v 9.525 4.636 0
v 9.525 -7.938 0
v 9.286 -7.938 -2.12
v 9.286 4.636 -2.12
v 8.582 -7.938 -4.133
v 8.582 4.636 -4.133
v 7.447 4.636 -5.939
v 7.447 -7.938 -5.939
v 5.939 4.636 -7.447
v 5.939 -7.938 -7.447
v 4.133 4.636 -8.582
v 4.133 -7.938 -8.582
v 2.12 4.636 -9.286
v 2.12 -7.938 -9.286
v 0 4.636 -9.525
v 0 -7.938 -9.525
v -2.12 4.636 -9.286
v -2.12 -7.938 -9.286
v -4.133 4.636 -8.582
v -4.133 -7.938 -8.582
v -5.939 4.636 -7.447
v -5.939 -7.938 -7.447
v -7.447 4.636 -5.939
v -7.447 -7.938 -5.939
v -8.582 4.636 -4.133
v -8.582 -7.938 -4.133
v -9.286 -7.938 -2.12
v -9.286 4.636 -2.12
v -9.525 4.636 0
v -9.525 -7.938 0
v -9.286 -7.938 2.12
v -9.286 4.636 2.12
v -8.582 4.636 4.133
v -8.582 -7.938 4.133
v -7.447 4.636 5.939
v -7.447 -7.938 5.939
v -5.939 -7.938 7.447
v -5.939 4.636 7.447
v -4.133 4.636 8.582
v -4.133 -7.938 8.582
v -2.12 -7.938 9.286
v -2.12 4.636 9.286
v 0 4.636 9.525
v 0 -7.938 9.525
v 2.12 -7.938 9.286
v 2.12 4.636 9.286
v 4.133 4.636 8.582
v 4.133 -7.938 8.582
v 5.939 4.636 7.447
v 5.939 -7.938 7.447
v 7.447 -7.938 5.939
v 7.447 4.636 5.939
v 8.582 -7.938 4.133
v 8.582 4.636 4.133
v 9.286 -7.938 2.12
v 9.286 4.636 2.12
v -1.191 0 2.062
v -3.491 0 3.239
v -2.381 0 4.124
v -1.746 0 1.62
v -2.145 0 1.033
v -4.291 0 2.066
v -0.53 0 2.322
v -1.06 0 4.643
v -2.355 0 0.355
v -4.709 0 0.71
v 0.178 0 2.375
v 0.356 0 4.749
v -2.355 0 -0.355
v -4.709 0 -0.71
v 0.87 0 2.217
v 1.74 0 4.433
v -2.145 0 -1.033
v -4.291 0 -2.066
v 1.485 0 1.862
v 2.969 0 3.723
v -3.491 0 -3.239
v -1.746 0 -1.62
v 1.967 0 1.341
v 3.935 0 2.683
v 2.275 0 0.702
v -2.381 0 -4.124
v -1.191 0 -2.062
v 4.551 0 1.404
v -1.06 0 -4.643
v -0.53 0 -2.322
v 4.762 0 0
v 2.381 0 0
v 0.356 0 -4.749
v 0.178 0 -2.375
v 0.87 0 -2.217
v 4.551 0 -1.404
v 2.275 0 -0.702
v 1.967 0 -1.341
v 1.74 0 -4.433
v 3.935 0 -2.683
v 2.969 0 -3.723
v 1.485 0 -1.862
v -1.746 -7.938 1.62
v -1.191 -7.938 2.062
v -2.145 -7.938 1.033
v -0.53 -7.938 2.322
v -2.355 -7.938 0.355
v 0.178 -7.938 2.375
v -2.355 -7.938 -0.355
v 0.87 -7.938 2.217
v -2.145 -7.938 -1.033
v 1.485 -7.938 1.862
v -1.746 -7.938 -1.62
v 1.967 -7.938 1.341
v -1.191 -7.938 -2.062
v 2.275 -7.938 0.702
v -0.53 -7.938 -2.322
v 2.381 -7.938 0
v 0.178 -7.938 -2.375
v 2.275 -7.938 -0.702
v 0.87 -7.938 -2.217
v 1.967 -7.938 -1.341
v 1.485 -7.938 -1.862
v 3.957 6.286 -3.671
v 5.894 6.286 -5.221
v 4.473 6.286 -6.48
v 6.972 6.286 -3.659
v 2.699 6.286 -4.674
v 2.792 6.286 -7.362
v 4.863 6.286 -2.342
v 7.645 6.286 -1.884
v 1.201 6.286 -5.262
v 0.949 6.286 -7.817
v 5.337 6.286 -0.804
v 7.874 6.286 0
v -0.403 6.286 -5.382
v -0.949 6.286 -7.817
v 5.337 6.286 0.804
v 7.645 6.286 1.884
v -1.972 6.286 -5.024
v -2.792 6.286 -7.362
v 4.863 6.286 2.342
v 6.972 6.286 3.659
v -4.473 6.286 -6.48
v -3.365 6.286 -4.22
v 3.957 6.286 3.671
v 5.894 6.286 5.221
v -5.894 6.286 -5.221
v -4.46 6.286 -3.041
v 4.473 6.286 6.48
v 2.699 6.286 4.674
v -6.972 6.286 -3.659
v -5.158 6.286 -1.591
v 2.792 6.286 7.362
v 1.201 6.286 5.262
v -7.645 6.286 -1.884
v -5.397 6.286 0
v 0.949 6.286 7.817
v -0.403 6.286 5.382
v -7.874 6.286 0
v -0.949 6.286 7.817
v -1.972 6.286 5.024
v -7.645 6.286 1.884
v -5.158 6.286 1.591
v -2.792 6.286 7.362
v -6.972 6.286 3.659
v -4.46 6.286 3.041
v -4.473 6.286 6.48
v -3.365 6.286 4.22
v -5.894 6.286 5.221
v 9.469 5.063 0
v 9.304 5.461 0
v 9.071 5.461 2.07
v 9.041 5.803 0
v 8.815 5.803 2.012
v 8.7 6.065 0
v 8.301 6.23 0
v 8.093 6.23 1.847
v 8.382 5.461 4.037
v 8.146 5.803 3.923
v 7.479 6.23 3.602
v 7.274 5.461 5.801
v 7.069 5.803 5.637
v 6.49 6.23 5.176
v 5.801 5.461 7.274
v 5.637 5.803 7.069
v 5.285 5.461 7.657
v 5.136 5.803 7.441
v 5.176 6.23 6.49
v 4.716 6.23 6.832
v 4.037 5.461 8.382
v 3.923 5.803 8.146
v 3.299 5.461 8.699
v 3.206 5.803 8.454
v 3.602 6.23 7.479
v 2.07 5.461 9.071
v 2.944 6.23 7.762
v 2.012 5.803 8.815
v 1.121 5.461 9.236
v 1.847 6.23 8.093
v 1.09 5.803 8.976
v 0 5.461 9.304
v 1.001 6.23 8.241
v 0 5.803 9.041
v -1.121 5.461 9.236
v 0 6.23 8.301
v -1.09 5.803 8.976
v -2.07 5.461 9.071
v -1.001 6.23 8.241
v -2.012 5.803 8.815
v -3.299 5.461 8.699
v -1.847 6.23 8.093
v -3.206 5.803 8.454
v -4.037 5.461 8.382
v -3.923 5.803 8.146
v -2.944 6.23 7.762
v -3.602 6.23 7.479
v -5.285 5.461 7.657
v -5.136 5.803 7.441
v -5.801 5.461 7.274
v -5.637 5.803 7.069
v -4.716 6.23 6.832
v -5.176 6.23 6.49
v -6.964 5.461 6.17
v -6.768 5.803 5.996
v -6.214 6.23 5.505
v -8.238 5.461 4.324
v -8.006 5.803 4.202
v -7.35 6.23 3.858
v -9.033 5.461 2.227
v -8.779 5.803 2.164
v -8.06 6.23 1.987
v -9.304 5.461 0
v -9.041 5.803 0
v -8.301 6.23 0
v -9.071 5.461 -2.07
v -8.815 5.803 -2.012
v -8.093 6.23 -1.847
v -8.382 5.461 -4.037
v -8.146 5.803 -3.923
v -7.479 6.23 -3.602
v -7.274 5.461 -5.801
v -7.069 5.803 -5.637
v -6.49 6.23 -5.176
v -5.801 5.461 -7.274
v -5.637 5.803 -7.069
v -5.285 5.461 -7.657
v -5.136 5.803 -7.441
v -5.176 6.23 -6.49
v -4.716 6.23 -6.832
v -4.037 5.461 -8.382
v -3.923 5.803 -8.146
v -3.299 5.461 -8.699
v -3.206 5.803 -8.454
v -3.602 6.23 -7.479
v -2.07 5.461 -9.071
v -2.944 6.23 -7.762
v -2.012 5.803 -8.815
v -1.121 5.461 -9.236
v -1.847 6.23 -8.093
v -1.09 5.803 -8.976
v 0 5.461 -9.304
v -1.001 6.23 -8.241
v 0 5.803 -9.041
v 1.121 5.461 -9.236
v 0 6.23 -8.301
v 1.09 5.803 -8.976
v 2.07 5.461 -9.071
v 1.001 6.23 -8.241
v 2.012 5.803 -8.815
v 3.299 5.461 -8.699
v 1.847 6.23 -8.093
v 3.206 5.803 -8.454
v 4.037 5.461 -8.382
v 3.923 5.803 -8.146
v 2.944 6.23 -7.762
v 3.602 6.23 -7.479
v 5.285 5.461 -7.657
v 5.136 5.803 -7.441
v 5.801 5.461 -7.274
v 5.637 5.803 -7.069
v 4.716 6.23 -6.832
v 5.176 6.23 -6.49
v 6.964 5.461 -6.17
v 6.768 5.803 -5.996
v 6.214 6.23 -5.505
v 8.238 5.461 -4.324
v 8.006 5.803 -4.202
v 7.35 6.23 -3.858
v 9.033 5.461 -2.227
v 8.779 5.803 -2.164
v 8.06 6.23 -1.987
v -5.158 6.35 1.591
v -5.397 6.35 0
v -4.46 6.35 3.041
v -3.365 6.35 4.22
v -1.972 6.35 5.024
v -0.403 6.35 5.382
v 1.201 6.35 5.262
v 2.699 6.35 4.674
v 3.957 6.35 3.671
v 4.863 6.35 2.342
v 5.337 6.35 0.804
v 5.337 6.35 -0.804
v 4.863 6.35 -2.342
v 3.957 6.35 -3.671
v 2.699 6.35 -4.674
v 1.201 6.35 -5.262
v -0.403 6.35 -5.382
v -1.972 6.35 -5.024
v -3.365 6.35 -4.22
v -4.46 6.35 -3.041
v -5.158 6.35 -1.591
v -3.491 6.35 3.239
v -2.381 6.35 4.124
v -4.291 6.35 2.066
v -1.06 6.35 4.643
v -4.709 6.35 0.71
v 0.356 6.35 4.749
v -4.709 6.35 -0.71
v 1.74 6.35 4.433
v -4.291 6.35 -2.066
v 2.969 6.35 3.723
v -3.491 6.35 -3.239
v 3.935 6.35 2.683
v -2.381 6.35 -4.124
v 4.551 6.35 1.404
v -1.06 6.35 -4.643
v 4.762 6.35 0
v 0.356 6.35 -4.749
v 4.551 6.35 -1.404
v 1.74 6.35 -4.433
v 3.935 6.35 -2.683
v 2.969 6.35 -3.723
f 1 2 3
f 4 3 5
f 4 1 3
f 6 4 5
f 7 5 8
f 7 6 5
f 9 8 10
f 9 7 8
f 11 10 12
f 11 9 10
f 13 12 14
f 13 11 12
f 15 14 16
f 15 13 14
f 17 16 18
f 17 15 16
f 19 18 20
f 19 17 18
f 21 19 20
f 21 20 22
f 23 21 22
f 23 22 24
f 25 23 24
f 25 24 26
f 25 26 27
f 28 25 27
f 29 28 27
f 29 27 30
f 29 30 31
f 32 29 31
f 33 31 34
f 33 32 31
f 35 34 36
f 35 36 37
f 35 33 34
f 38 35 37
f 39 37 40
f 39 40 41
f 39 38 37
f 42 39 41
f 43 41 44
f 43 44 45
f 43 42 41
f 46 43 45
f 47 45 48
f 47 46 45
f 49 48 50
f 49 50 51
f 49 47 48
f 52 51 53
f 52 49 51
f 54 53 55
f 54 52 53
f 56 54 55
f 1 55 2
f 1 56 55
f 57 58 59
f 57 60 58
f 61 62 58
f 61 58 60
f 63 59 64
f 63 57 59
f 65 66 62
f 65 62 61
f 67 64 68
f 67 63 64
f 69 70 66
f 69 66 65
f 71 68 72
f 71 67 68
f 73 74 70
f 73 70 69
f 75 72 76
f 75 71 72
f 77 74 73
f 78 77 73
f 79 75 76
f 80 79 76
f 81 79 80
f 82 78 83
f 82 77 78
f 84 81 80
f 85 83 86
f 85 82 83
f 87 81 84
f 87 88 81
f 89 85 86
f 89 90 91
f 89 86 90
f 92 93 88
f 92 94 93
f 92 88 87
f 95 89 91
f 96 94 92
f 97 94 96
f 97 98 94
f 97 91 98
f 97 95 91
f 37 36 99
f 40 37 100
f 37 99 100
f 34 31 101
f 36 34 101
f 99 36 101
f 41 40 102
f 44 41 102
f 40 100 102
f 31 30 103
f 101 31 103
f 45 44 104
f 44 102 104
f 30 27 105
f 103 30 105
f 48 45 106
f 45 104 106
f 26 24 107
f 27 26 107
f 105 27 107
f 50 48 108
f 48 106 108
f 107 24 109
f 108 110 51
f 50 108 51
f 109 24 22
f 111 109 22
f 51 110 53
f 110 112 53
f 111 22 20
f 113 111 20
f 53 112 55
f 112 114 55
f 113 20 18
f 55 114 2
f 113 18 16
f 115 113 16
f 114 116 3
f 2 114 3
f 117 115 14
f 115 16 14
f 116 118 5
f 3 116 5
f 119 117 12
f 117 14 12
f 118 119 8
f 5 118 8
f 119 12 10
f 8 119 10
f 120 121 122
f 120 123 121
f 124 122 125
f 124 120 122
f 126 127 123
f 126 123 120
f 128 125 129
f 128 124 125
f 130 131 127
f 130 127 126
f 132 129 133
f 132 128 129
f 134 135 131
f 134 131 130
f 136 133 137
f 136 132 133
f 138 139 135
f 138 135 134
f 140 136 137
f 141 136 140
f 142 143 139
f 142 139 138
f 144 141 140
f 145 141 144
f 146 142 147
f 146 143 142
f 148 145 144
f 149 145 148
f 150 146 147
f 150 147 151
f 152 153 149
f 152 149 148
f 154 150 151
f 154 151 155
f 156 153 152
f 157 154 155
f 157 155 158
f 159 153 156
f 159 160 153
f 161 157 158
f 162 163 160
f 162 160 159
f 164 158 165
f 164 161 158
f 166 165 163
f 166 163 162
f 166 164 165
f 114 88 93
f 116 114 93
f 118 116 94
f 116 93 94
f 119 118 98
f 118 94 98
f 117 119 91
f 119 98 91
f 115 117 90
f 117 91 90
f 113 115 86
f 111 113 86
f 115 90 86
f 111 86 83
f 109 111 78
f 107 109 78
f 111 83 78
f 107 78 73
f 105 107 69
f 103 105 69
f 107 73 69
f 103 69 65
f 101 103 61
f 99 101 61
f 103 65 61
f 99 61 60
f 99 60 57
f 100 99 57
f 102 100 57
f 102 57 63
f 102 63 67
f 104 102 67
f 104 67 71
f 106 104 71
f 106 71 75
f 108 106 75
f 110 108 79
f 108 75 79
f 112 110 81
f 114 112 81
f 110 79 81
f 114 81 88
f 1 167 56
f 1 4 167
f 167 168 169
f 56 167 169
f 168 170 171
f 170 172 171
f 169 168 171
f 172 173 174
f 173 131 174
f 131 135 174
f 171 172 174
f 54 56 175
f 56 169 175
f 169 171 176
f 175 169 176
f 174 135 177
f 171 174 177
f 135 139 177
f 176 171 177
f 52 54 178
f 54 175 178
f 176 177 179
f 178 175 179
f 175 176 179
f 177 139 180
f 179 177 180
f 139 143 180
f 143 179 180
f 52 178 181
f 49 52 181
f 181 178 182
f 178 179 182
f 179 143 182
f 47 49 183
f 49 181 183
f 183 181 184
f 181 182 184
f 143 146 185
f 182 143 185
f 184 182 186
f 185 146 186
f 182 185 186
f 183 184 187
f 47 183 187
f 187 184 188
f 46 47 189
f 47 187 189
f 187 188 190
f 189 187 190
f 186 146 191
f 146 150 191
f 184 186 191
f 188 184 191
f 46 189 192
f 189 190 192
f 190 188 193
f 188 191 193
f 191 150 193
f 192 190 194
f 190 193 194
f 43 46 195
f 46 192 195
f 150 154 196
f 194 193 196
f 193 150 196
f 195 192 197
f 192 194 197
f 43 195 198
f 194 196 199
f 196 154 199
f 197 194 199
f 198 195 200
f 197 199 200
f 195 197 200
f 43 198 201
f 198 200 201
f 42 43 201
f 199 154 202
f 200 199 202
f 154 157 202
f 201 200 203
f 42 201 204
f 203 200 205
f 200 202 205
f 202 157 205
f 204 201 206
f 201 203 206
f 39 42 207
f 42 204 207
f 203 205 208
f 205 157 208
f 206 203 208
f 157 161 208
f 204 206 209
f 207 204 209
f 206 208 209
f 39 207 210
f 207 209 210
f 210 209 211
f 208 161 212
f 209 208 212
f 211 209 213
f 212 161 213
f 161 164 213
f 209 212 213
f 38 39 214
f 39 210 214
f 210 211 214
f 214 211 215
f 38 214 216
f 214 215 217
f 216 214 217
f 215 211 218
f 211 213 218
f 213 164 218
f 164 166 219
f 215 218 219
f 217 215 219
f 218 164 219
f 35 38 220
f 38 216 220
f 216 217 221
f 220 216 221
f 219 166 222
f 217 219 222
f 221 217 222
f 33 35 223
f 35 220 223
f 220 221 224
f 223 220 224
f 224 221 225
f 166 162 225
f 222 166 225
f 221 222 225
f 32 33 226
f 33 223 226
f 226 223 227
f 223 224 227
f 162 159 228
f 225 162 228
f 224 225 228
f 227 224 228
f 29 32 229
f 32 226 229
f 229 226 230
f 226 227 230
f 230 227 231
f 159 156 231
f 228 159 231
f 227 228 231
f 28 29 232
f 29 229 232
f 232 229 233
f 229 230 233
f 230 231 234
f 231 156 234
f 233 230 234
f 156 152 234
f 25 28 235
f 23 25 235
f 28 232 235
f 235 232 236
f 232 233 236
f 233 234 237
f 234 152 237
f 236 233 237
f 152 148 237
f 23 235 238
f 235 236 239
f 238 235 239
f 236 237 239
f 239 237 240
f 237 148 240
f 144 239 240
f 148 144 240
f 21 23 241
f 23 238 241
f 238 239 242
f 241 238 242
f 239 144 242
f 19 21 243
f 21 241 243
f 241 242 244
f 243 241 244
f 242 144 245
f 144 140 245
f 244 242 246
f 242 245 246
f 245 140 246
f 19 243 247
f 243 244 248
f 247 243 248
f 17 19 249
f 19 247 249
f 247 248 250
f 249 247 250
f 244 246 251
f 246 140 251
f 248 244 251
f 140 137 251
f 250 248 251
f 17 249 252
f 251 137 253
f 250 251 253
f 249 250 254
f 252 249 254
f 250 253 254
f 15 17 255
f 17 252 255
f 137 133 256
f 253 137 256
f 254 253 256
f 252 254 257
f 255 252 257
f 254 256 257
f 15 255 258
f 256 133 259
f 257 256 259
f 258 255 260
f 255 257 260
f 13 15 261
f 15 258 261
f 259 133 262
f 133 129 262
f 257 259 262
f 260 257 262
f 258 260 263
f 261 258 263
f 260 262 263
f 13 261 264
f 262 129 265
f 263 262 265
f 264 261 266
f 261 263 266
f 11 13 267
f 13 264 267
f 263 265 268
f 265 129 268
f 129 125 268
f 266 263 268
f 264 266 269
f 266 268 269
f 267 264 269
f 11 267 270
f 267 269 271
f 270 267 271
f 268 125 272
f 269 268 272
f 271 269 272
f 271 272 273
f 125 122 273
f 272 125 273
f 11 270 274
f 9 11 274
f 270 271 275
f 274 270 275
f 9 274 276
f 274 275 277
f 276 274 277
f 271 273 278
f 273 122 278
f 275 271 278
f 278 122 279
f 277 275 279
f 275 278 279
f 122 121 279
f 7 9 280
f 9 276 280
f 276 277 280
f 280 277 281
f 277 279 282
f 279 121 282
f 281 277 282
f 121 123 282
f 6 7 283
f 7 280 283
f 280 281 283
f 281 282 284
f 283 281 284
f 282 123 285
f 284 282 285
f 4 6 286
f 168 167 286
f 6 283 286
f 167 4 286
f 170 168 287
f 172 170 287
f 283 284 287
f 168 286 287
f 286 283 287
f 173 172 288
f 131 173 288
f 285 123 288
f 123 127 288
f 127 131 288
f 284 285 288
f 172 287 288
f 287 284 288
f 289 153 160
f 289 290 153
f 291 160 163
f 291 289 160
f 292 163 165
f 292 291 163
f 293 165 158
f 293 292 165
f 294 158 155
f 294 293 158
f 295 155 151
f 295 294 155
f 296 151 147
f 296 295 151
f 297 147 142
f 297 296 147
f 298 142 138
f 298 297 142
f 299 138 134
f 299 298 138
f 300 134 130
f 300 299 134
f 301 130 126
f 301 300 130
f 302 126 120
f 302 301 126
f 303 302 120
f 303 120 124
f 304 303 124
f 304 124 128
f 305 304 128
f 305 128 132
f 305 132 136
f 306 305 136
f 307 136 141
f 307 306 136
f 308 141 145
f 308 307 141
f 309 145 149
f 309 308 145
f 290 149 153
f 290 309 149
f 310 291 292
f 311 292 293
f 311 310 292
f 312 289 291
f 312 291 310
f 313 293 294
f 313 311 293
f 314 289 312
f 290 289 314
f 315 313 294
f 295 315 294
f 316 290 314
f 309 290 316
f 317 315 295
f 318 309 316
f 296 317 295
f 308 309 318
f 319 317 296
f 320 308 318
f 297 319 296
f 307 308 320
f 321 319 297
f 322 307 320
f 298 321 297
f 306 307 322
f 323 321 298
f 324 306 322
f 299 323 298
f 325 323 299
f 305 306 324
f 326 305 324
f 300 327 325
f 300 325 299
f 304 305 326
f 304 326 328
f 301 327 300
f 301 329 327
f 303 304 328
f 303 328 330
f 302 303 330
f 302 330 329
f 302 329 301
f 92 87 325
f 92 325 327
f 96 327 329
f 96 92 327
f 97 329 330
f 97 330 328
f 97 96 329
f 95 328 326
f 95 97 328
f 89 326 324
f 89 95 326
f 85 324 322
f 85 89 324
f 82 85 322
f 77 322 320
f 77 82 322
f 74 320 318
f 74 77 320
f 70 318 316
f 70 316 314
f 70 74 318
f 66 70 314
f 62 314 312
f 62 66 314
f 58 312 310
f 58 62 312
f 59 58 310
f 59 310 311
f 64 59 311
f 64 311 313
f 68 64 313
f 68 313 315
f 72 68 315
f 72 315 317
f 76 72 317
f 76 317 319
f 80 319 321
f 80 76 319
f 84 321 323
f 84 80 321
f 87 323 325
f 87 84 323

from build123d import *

# Parameters (mm, degrees)
SKETCH3_R                = 9.525
SKETCH3_R_2              = 2.38125
BOSS_EXTRUDE1_DEPTH      = 6.35
BOSS_EXTRUDE1_DEPTH_BACK = 7.9375
SKETCH4_R                = 4.7625
CUT_EXTRUDE1_DEPTH       = 6.35
SKETCH5_W                = 4.1275
SKETCH5_H                = 0.0635
FILLET2_R                = 1.651


with BuildPart() as part:
    # Sketch3 → Boss-Extrude1 (new body, two sides)
    with BuildSketch(Plane(origin=(0, 0, 0), x_dir=(1, 0, 0), z_dir=(0, 1, 0))) as boss_extrude1_sk:
        Circle(SKETCH3_R)
        Circle(SKETCH3_R_2, mode=Mode.SUBTRACT)
    extrude(amount=BOSS_EXTRUDE1_DEPTH)
    extrude(boss_extrude1_sk.sketch, amount=-BOSS_EXTRUDE1_DEPTH_BACK)

    # Sketch4 → Cut-Extrude1 (cut)
    with BuildSketch(Plane(origin=(0, 0, 0), x_dir=(1, 0, 0), z_dir=(0, 1, 0))):
        Circle(SKETCH4_R)
    extrude(amount=CUT_EXTRUDE1_DEPTH, mode=Mode.SUBTRACT)

    # Sketch5 → Cut-Revolve1 (revolve, cut)
    with BuildSketch(Plane.XY):
        with Locations((-7.46125, 6.31825)):
            Rectangle(SKETCH5_W, SKETCH5_H)
    revolve(axis=Axis((0, -7.9375, 0), (0, 1, 0)), mode=Mode.SUBTRACT)

    # Fillet2
    fillet2_edges = [part.edges().sort_by_distance(p)[0] for p in [
        (-9.525, 6.2865, 0),
    ]]
    fillet(fillet2_edges, radius=FILLET2_R)


solid = part.part
